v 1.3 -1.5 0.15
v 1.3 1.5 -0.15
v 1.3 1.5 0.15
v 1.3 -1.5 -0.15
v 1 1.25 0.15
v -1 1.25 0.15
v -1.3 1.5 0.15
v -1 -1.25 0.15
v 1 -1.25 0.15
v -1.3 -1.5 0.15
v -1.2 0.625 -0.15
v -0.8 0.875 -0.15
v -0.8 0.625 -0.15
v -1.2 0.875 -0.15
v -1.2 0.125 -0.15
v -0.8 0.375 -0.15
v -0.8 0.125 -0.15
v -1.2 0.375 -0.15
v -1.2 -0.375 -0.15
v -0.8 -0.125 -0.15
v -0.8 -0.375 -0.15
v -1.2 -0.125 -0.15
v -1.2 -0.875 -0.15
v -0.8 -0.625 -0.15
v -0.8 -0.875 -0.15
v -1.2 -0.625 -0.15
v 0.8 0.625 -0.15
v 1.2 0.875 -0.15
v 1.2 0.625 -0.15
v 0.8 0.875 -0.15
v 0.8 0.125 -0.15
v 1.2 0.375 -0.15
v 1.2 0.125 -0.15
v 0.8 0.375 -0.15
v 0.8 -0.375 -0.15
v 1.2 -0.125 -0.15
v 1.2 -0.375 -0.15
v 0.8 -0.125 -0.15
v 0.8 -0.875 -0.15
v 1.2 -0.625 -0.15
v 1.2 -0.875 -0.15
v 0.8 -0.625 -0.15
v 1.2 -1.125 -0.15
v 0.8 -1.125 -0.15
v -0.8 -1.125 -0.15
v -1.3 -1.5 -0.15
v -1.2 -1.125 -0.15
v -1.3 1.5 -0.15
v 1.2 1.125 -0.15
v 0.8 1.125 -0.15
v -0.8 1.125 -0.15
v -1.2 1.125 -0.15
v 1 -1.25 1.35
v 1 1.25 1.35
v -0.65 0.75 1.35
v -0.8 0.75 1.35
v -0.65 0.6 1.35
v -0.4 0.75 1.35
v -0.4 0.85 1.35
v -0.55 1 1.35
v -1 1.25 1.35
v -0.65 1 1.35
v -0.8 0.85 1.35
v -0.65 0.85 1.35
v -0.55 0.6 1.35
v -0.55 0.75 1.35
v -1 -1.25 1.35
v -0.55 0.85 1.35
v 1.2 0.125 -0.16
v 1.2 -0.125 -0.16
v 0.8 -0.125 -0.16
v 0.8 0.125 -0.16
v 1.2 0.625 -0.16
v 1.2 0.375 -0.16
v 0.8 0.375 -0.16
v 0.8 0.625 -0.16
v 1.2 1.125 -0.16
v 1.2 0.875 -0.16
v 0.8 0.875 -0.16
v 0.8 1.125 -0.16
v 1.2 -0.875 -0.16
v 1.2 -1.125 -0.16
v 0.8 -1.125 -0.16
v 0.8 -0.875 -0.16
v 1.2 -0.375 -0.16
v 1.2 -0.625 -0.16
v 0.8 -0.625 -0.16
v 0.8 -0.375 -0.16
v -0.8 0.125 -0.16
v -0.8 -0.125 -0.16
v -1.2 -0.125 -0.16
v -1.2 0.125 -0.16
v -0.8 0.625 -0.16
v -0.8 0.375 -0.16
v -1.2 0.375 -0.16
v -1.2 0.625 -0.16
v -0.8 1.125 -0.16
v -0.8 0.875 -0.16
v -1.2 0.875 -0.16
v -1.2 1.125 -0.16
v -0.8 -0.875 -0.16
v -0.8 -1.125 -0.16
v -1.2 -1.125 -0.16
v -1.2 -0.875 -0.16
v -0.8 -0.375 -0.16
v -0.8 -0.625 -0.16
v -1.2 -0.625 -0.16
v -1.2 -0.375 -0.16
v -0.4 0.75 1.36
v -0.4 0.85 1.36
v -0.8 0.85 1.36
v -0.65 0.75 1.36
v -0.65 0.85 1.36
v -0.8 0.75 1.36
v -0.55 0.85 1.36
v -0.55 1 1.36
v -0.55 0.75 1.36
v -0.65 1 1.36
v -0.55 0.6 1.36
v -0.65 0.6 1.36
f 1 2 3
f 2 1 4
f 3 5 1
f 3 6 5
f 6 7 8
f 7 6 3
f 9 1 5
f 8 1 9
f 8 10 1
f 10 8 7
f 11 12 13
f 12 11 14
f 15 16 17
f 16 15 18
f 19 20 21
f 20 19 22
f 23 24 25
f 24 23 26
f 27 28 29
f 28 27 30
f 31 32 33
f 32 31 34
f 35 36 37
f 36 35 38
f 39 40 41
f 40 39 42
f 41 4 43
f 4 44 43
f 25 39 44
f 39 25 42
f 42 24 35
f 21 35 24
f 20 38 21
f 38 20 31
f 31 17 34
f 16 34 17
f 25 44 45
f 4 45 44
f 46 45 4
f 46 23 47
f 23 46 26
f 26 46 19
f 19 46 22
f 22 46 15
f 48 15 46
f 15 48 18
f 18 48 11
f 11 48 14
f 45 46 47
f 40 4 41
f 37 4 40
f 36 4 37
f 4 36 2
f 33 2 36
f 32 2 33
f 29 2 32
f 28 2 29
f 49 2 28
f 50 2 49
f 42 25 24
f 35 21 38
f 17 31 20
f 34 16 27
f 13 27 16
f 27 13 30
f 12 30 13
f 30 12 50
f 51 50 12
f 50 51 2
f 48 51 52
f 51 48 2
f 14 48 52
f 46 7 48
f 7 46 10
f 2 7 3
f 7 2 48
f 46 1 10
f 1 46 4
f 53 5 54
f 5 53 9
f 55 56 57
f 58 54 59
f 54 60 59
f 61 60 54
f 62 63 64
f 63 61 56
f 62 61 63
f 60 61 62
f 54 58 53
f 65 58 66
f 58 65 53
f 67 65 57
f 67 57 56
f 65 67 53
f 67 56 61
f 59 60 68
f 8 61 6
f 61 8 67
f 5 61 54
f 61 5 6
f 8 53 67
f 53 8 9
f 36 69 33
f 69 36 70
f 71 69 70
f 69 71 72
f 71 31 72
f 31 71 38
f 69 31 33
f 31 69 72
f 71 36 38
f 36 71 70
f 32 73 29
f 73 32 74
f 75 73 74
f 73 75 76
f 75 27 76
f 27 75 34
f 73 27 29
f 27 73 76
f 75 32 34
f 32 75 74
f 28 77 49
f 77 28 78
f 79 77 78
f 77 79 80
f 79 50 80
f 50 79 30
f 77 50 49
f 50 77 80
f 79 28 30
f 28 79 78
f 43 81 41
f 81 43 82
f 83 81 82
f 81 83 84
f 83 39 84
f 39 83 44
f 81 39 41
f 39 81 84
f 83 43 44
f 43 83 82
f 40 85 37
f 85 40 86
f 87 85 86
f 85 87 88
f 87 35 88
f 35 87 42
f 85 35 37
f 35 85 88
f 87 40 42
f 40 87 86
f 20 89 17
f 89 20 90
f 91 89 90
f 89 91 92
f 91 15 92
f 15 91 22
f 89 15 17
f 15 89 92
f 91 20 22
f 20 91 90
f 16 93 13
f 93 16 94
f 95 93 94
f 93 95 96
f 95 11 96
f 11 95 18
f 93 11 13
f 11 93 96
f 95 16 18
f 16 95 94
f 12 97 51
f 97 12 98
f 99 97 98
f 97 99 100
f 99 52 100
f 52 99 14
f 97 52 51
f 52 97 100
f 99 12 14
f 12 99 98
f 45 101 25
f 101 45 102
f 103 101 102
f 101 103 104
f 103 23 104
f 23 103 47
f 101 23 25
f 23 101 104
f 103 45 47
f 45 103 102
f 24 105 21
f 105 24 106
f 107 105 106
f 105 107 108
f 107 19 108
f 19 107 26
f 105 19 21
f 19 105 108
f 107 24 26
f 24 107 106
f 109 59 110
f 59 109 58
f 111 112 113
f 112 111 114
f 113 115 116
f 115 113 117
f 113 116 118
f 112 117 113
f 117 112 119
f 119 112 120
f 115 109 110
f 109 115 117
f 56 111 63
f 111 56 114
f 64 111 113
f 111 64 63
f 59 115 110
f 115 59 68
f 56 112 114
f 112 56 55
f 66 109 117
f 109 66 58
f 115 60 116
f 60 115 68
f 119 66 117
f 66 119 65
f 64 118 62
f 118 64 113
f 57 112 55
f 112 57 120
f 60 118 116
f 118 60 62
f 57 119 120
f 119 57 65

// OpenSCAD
color("Green")cube([2.6,3,0.3],true);
color("Gray")translate([0,0,(1.2+0.3)/2])cube([2,2.5,1.2],true);
color("Gold")translate([1,0,-0.11])cube([0.4,0.25,0.1],true);
color("Gold")translate([1,0.5,-0.11])cube([0.4,0.25,0.1],true);
color("Gold")translate([1,1,-0.11])cube([0.4,0.25,0.1],true);
color("Gold")translate([1,-1,-0.11])cube([0.4,0.25,0.1],true);
color("Gold")translate([1,-0.5,-0.11])cube([0.4,0.25,0.1],true);
color("Gold")translate([-1,0,-0.11])cube([0.4,0.25,0.1],true);
color("Gold")translate([-1,0.5,-0.11])cube([0.4,0.25,0.1],true);
color("Gold")translate([-1,1,-0.11])cube([0.4,0.25,0.1],true);
color("Gold")translate([-1,-1,-0.11])cube([0.4,0.25,0.1],true);
color("Gold")translate([-1,-0.5,-0.11])cube([0.4,0.25,0.1],true);

color("White")translate([-0.6,0.8,(1.2+0.11)])cube([0.4,0.1,0.1],true);
color("White")translate([-0.6,0.8,(1.2+0.11)])cube([0.1,0.4,0.1],true);
